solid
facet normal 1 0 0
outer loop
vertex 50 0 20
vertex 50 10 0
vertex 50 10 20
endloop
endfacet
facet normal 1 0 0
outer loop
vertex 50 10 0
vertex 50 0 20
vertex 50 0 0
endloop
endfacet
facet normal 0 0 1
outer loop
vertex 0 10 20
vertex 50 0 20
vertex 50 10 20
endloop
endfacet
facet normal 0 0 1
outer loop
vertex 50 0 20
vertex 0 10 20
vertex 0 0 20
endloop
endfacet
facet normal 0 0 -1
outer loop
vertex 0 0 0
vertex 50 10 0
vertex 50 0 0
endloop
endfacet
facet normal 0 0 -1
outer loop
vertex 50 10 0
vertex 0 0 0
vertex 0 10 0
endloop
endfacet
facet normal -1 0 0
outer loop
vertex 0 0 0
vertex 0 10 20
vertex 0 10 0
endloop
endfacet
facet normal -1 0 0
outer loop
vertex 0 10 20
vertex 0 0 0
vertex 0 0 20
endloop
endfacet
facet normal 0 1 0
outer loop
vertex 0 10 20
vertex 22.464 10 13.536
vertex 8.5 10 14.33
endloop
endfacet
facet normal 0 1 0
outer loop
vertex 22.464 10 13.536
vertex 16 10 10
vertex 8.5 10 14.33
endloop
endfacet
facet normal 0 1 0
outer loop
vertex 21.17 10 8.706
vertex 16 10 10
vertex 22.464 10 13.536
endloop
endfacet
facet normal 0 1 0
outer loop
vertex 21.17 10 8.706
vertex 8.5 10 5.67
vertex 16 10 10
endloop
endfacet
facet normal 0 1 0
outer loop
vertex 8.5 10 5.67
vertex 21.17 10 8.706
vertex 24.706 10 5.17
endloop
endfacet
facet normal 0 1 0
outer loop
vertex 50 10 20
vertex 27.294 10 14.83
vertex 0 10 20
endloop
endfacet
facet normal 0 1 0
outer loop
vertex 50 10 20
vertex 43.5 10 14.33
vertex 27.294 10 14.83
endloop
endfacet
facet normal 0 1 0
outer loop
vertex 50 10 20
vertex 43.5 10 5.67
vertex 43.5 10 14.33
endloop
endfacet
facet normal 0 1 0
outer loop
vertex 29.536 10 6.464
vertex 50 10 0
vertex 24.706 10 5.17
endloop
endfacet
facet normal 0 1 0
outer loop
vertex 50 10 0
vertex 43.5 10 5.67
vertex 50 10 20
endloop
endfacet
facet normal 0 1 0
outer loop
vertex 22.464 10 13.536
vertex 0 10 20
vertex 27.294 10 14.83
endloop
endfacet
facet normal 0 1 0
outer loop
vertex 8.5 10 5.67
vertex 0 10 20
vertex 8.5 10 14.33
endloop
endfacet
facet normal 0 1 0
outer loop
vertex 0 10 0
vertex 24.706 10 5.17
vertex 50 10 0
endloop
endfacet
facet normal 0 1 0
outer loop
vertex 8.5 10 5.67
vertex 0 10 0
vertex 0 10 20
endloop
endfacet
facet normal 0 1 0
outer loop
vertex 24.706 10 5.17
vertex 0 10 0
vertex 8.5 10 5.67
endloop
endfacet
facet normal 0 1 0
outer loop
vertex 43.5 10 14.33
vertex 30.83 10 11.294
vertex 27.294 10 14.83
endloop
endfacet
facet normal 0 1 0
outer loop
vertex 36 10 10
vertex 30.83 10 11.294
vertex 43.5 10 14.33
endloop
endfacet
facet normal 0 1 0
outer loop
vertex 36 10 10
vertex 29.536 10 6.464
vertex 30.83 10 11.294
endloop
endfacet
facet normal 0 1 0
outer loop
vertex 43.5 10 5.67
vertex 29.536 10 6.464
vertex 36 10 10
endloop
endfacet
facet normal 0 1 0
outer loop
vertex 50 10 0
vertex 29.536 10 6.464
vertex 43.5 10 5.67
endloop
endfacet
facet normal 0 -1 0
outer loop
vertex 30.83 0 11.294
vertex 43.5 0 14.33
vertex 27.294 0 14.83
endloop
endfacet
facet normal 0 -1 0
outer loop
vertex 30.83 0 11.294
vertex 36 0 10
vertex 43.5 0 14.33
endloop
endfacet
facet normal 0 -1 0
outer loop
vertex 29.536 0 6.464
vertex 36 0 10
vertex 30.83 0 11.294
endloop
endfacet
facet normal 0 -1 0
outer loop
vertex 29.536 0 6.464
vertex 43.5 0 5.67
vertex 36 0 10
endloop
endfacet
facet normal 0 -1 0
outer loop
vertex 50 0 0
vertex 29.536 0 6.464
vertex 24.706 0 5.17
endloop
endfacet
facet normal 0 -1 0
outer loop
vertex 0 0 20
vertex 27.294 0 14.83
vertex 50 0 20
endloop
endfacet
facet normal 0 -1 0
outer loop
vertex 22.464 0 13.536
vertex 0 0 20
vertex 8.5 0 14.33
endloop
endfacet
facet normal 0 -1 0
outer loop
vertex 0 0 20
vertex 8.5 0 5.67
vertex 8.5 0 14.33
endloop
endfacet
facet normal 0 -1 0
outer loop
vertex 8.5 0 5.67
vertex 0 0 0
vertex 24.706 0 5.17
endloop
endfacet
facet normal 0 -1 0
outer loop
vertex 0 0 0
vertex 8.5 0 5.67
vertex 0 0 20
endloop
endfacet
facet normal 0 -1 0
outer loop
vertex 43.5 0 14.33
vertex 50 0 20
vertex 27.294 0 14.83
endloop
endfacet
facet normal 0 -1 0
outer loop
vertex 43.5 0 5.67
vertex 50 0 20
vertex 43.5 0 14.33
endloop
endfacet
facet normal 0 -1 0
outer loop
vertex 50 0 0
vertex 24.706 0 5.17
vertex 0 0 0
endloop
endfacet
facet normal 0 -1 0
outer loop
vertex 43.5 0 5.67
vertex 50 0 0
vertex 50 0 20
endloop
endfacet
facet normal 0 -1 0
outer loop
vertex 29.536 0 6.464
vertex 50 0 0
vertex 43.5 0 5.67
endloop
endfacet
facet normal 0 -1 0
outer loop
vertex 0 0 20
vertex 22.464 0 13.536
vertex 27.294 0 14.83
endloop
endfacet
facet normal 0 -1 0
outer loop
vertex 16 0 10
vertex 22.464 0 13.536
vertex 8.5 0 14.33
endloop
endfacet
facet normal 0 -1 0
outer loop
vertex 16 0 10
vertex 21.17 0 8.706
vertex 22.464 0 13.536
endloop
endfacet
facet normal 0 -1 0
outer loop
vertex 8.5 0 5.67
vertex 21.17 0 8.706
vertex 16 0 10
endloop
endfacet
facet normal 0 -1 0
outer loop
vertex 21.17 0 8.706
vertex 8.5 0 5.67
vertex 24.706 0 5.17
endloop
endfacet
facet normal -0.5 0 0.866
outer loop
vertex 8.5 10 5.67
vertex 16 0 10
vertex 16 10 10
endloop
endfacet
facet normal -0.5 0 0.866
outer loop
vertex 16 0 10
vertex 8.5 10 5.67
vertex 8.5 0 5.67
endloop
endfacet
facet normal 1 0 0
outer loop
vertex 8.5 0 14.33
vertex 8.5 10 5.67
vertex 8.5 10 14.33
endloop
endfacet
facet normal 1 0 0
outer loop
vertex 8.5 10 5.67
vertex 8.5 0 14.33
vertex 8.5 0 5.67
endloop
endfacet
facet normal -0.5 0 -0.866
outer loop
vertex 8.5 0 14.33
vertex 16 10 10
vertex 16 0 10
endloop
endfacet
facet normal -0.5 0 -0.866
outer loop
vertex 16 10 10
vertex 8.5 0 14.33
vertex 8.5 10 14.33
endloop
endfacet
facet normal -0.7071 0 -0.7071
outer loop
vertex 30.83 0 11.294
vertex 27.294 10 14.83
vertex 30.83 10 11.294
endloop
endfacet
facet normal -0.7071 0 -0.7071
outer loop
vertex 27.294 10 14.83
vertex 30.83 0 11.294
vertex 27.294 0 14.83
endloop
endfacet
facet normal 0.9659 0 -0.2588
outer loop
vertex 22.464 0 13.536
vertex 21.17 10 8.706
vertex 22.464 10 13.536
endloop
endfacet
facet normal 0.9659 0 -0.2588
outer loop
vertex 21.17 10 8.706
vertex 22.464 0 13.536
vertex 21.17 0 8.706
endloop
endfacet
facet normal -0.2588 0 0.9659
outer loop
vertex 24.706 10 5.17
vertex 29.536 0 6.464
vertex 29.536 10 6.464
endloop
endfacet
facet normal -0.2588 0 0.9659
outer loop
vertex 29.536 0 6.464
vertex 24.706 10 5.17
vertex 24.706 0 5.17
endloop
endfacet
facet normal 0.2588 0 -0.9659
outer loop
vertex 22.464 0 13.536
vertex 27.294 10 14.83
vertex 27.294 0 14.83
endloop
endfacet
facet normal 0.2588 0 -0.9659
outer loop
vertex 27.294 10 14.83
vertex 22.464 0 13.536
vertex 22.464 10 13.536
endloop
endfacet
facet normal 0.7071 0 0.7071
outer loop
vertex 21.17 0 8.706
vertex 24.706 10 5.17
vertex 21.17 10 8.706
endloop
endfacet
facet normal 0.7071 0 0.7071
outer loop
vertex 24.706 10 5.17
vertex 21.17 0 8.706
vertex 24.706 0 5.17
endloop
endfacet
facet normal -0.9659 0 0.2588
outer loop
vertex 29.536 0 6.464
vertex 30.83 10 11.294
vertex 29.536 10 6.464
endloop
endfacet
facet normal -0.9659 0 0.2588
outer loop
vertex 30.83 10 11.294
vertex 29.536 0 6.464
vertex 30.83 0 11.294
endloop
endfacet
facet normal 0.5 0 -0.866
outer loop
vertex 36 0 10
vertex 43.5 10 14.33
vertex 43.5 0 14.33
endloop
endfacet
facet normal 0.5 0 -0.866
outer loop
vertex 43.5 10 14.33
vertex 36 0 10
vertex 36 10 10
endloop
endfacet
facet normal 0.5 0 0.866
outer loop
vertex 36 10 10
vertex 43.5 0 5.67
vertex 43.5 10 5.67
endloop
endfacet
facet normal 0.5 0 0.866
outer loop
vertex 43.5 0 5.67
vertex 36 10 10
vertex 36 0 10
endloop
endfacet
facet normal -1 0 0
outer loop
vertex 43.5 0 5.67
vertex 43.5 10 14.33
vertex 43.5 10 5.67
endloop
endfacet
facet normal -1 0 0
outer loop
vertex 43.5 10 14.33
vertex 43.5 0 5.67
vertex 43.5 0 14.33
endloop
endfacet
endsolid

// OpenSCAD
difference(){
cube([50,10,20]);
rotate([90,0,0]) translate([11,10,-20]) cylinder(30,r=5, $fn=3);
rotate([90,0,0]) translate([26,10,-20]) rotate([0,0,15]) cylinder(30,r=5, $fn=6);
rotate([90,0,180]) translate([-41,10,-10]) cylinder(30,r=5, $fn=3);
}
//rotate([90,0,0]) translate([11,10,-20]) cylinder(30,r=5);
